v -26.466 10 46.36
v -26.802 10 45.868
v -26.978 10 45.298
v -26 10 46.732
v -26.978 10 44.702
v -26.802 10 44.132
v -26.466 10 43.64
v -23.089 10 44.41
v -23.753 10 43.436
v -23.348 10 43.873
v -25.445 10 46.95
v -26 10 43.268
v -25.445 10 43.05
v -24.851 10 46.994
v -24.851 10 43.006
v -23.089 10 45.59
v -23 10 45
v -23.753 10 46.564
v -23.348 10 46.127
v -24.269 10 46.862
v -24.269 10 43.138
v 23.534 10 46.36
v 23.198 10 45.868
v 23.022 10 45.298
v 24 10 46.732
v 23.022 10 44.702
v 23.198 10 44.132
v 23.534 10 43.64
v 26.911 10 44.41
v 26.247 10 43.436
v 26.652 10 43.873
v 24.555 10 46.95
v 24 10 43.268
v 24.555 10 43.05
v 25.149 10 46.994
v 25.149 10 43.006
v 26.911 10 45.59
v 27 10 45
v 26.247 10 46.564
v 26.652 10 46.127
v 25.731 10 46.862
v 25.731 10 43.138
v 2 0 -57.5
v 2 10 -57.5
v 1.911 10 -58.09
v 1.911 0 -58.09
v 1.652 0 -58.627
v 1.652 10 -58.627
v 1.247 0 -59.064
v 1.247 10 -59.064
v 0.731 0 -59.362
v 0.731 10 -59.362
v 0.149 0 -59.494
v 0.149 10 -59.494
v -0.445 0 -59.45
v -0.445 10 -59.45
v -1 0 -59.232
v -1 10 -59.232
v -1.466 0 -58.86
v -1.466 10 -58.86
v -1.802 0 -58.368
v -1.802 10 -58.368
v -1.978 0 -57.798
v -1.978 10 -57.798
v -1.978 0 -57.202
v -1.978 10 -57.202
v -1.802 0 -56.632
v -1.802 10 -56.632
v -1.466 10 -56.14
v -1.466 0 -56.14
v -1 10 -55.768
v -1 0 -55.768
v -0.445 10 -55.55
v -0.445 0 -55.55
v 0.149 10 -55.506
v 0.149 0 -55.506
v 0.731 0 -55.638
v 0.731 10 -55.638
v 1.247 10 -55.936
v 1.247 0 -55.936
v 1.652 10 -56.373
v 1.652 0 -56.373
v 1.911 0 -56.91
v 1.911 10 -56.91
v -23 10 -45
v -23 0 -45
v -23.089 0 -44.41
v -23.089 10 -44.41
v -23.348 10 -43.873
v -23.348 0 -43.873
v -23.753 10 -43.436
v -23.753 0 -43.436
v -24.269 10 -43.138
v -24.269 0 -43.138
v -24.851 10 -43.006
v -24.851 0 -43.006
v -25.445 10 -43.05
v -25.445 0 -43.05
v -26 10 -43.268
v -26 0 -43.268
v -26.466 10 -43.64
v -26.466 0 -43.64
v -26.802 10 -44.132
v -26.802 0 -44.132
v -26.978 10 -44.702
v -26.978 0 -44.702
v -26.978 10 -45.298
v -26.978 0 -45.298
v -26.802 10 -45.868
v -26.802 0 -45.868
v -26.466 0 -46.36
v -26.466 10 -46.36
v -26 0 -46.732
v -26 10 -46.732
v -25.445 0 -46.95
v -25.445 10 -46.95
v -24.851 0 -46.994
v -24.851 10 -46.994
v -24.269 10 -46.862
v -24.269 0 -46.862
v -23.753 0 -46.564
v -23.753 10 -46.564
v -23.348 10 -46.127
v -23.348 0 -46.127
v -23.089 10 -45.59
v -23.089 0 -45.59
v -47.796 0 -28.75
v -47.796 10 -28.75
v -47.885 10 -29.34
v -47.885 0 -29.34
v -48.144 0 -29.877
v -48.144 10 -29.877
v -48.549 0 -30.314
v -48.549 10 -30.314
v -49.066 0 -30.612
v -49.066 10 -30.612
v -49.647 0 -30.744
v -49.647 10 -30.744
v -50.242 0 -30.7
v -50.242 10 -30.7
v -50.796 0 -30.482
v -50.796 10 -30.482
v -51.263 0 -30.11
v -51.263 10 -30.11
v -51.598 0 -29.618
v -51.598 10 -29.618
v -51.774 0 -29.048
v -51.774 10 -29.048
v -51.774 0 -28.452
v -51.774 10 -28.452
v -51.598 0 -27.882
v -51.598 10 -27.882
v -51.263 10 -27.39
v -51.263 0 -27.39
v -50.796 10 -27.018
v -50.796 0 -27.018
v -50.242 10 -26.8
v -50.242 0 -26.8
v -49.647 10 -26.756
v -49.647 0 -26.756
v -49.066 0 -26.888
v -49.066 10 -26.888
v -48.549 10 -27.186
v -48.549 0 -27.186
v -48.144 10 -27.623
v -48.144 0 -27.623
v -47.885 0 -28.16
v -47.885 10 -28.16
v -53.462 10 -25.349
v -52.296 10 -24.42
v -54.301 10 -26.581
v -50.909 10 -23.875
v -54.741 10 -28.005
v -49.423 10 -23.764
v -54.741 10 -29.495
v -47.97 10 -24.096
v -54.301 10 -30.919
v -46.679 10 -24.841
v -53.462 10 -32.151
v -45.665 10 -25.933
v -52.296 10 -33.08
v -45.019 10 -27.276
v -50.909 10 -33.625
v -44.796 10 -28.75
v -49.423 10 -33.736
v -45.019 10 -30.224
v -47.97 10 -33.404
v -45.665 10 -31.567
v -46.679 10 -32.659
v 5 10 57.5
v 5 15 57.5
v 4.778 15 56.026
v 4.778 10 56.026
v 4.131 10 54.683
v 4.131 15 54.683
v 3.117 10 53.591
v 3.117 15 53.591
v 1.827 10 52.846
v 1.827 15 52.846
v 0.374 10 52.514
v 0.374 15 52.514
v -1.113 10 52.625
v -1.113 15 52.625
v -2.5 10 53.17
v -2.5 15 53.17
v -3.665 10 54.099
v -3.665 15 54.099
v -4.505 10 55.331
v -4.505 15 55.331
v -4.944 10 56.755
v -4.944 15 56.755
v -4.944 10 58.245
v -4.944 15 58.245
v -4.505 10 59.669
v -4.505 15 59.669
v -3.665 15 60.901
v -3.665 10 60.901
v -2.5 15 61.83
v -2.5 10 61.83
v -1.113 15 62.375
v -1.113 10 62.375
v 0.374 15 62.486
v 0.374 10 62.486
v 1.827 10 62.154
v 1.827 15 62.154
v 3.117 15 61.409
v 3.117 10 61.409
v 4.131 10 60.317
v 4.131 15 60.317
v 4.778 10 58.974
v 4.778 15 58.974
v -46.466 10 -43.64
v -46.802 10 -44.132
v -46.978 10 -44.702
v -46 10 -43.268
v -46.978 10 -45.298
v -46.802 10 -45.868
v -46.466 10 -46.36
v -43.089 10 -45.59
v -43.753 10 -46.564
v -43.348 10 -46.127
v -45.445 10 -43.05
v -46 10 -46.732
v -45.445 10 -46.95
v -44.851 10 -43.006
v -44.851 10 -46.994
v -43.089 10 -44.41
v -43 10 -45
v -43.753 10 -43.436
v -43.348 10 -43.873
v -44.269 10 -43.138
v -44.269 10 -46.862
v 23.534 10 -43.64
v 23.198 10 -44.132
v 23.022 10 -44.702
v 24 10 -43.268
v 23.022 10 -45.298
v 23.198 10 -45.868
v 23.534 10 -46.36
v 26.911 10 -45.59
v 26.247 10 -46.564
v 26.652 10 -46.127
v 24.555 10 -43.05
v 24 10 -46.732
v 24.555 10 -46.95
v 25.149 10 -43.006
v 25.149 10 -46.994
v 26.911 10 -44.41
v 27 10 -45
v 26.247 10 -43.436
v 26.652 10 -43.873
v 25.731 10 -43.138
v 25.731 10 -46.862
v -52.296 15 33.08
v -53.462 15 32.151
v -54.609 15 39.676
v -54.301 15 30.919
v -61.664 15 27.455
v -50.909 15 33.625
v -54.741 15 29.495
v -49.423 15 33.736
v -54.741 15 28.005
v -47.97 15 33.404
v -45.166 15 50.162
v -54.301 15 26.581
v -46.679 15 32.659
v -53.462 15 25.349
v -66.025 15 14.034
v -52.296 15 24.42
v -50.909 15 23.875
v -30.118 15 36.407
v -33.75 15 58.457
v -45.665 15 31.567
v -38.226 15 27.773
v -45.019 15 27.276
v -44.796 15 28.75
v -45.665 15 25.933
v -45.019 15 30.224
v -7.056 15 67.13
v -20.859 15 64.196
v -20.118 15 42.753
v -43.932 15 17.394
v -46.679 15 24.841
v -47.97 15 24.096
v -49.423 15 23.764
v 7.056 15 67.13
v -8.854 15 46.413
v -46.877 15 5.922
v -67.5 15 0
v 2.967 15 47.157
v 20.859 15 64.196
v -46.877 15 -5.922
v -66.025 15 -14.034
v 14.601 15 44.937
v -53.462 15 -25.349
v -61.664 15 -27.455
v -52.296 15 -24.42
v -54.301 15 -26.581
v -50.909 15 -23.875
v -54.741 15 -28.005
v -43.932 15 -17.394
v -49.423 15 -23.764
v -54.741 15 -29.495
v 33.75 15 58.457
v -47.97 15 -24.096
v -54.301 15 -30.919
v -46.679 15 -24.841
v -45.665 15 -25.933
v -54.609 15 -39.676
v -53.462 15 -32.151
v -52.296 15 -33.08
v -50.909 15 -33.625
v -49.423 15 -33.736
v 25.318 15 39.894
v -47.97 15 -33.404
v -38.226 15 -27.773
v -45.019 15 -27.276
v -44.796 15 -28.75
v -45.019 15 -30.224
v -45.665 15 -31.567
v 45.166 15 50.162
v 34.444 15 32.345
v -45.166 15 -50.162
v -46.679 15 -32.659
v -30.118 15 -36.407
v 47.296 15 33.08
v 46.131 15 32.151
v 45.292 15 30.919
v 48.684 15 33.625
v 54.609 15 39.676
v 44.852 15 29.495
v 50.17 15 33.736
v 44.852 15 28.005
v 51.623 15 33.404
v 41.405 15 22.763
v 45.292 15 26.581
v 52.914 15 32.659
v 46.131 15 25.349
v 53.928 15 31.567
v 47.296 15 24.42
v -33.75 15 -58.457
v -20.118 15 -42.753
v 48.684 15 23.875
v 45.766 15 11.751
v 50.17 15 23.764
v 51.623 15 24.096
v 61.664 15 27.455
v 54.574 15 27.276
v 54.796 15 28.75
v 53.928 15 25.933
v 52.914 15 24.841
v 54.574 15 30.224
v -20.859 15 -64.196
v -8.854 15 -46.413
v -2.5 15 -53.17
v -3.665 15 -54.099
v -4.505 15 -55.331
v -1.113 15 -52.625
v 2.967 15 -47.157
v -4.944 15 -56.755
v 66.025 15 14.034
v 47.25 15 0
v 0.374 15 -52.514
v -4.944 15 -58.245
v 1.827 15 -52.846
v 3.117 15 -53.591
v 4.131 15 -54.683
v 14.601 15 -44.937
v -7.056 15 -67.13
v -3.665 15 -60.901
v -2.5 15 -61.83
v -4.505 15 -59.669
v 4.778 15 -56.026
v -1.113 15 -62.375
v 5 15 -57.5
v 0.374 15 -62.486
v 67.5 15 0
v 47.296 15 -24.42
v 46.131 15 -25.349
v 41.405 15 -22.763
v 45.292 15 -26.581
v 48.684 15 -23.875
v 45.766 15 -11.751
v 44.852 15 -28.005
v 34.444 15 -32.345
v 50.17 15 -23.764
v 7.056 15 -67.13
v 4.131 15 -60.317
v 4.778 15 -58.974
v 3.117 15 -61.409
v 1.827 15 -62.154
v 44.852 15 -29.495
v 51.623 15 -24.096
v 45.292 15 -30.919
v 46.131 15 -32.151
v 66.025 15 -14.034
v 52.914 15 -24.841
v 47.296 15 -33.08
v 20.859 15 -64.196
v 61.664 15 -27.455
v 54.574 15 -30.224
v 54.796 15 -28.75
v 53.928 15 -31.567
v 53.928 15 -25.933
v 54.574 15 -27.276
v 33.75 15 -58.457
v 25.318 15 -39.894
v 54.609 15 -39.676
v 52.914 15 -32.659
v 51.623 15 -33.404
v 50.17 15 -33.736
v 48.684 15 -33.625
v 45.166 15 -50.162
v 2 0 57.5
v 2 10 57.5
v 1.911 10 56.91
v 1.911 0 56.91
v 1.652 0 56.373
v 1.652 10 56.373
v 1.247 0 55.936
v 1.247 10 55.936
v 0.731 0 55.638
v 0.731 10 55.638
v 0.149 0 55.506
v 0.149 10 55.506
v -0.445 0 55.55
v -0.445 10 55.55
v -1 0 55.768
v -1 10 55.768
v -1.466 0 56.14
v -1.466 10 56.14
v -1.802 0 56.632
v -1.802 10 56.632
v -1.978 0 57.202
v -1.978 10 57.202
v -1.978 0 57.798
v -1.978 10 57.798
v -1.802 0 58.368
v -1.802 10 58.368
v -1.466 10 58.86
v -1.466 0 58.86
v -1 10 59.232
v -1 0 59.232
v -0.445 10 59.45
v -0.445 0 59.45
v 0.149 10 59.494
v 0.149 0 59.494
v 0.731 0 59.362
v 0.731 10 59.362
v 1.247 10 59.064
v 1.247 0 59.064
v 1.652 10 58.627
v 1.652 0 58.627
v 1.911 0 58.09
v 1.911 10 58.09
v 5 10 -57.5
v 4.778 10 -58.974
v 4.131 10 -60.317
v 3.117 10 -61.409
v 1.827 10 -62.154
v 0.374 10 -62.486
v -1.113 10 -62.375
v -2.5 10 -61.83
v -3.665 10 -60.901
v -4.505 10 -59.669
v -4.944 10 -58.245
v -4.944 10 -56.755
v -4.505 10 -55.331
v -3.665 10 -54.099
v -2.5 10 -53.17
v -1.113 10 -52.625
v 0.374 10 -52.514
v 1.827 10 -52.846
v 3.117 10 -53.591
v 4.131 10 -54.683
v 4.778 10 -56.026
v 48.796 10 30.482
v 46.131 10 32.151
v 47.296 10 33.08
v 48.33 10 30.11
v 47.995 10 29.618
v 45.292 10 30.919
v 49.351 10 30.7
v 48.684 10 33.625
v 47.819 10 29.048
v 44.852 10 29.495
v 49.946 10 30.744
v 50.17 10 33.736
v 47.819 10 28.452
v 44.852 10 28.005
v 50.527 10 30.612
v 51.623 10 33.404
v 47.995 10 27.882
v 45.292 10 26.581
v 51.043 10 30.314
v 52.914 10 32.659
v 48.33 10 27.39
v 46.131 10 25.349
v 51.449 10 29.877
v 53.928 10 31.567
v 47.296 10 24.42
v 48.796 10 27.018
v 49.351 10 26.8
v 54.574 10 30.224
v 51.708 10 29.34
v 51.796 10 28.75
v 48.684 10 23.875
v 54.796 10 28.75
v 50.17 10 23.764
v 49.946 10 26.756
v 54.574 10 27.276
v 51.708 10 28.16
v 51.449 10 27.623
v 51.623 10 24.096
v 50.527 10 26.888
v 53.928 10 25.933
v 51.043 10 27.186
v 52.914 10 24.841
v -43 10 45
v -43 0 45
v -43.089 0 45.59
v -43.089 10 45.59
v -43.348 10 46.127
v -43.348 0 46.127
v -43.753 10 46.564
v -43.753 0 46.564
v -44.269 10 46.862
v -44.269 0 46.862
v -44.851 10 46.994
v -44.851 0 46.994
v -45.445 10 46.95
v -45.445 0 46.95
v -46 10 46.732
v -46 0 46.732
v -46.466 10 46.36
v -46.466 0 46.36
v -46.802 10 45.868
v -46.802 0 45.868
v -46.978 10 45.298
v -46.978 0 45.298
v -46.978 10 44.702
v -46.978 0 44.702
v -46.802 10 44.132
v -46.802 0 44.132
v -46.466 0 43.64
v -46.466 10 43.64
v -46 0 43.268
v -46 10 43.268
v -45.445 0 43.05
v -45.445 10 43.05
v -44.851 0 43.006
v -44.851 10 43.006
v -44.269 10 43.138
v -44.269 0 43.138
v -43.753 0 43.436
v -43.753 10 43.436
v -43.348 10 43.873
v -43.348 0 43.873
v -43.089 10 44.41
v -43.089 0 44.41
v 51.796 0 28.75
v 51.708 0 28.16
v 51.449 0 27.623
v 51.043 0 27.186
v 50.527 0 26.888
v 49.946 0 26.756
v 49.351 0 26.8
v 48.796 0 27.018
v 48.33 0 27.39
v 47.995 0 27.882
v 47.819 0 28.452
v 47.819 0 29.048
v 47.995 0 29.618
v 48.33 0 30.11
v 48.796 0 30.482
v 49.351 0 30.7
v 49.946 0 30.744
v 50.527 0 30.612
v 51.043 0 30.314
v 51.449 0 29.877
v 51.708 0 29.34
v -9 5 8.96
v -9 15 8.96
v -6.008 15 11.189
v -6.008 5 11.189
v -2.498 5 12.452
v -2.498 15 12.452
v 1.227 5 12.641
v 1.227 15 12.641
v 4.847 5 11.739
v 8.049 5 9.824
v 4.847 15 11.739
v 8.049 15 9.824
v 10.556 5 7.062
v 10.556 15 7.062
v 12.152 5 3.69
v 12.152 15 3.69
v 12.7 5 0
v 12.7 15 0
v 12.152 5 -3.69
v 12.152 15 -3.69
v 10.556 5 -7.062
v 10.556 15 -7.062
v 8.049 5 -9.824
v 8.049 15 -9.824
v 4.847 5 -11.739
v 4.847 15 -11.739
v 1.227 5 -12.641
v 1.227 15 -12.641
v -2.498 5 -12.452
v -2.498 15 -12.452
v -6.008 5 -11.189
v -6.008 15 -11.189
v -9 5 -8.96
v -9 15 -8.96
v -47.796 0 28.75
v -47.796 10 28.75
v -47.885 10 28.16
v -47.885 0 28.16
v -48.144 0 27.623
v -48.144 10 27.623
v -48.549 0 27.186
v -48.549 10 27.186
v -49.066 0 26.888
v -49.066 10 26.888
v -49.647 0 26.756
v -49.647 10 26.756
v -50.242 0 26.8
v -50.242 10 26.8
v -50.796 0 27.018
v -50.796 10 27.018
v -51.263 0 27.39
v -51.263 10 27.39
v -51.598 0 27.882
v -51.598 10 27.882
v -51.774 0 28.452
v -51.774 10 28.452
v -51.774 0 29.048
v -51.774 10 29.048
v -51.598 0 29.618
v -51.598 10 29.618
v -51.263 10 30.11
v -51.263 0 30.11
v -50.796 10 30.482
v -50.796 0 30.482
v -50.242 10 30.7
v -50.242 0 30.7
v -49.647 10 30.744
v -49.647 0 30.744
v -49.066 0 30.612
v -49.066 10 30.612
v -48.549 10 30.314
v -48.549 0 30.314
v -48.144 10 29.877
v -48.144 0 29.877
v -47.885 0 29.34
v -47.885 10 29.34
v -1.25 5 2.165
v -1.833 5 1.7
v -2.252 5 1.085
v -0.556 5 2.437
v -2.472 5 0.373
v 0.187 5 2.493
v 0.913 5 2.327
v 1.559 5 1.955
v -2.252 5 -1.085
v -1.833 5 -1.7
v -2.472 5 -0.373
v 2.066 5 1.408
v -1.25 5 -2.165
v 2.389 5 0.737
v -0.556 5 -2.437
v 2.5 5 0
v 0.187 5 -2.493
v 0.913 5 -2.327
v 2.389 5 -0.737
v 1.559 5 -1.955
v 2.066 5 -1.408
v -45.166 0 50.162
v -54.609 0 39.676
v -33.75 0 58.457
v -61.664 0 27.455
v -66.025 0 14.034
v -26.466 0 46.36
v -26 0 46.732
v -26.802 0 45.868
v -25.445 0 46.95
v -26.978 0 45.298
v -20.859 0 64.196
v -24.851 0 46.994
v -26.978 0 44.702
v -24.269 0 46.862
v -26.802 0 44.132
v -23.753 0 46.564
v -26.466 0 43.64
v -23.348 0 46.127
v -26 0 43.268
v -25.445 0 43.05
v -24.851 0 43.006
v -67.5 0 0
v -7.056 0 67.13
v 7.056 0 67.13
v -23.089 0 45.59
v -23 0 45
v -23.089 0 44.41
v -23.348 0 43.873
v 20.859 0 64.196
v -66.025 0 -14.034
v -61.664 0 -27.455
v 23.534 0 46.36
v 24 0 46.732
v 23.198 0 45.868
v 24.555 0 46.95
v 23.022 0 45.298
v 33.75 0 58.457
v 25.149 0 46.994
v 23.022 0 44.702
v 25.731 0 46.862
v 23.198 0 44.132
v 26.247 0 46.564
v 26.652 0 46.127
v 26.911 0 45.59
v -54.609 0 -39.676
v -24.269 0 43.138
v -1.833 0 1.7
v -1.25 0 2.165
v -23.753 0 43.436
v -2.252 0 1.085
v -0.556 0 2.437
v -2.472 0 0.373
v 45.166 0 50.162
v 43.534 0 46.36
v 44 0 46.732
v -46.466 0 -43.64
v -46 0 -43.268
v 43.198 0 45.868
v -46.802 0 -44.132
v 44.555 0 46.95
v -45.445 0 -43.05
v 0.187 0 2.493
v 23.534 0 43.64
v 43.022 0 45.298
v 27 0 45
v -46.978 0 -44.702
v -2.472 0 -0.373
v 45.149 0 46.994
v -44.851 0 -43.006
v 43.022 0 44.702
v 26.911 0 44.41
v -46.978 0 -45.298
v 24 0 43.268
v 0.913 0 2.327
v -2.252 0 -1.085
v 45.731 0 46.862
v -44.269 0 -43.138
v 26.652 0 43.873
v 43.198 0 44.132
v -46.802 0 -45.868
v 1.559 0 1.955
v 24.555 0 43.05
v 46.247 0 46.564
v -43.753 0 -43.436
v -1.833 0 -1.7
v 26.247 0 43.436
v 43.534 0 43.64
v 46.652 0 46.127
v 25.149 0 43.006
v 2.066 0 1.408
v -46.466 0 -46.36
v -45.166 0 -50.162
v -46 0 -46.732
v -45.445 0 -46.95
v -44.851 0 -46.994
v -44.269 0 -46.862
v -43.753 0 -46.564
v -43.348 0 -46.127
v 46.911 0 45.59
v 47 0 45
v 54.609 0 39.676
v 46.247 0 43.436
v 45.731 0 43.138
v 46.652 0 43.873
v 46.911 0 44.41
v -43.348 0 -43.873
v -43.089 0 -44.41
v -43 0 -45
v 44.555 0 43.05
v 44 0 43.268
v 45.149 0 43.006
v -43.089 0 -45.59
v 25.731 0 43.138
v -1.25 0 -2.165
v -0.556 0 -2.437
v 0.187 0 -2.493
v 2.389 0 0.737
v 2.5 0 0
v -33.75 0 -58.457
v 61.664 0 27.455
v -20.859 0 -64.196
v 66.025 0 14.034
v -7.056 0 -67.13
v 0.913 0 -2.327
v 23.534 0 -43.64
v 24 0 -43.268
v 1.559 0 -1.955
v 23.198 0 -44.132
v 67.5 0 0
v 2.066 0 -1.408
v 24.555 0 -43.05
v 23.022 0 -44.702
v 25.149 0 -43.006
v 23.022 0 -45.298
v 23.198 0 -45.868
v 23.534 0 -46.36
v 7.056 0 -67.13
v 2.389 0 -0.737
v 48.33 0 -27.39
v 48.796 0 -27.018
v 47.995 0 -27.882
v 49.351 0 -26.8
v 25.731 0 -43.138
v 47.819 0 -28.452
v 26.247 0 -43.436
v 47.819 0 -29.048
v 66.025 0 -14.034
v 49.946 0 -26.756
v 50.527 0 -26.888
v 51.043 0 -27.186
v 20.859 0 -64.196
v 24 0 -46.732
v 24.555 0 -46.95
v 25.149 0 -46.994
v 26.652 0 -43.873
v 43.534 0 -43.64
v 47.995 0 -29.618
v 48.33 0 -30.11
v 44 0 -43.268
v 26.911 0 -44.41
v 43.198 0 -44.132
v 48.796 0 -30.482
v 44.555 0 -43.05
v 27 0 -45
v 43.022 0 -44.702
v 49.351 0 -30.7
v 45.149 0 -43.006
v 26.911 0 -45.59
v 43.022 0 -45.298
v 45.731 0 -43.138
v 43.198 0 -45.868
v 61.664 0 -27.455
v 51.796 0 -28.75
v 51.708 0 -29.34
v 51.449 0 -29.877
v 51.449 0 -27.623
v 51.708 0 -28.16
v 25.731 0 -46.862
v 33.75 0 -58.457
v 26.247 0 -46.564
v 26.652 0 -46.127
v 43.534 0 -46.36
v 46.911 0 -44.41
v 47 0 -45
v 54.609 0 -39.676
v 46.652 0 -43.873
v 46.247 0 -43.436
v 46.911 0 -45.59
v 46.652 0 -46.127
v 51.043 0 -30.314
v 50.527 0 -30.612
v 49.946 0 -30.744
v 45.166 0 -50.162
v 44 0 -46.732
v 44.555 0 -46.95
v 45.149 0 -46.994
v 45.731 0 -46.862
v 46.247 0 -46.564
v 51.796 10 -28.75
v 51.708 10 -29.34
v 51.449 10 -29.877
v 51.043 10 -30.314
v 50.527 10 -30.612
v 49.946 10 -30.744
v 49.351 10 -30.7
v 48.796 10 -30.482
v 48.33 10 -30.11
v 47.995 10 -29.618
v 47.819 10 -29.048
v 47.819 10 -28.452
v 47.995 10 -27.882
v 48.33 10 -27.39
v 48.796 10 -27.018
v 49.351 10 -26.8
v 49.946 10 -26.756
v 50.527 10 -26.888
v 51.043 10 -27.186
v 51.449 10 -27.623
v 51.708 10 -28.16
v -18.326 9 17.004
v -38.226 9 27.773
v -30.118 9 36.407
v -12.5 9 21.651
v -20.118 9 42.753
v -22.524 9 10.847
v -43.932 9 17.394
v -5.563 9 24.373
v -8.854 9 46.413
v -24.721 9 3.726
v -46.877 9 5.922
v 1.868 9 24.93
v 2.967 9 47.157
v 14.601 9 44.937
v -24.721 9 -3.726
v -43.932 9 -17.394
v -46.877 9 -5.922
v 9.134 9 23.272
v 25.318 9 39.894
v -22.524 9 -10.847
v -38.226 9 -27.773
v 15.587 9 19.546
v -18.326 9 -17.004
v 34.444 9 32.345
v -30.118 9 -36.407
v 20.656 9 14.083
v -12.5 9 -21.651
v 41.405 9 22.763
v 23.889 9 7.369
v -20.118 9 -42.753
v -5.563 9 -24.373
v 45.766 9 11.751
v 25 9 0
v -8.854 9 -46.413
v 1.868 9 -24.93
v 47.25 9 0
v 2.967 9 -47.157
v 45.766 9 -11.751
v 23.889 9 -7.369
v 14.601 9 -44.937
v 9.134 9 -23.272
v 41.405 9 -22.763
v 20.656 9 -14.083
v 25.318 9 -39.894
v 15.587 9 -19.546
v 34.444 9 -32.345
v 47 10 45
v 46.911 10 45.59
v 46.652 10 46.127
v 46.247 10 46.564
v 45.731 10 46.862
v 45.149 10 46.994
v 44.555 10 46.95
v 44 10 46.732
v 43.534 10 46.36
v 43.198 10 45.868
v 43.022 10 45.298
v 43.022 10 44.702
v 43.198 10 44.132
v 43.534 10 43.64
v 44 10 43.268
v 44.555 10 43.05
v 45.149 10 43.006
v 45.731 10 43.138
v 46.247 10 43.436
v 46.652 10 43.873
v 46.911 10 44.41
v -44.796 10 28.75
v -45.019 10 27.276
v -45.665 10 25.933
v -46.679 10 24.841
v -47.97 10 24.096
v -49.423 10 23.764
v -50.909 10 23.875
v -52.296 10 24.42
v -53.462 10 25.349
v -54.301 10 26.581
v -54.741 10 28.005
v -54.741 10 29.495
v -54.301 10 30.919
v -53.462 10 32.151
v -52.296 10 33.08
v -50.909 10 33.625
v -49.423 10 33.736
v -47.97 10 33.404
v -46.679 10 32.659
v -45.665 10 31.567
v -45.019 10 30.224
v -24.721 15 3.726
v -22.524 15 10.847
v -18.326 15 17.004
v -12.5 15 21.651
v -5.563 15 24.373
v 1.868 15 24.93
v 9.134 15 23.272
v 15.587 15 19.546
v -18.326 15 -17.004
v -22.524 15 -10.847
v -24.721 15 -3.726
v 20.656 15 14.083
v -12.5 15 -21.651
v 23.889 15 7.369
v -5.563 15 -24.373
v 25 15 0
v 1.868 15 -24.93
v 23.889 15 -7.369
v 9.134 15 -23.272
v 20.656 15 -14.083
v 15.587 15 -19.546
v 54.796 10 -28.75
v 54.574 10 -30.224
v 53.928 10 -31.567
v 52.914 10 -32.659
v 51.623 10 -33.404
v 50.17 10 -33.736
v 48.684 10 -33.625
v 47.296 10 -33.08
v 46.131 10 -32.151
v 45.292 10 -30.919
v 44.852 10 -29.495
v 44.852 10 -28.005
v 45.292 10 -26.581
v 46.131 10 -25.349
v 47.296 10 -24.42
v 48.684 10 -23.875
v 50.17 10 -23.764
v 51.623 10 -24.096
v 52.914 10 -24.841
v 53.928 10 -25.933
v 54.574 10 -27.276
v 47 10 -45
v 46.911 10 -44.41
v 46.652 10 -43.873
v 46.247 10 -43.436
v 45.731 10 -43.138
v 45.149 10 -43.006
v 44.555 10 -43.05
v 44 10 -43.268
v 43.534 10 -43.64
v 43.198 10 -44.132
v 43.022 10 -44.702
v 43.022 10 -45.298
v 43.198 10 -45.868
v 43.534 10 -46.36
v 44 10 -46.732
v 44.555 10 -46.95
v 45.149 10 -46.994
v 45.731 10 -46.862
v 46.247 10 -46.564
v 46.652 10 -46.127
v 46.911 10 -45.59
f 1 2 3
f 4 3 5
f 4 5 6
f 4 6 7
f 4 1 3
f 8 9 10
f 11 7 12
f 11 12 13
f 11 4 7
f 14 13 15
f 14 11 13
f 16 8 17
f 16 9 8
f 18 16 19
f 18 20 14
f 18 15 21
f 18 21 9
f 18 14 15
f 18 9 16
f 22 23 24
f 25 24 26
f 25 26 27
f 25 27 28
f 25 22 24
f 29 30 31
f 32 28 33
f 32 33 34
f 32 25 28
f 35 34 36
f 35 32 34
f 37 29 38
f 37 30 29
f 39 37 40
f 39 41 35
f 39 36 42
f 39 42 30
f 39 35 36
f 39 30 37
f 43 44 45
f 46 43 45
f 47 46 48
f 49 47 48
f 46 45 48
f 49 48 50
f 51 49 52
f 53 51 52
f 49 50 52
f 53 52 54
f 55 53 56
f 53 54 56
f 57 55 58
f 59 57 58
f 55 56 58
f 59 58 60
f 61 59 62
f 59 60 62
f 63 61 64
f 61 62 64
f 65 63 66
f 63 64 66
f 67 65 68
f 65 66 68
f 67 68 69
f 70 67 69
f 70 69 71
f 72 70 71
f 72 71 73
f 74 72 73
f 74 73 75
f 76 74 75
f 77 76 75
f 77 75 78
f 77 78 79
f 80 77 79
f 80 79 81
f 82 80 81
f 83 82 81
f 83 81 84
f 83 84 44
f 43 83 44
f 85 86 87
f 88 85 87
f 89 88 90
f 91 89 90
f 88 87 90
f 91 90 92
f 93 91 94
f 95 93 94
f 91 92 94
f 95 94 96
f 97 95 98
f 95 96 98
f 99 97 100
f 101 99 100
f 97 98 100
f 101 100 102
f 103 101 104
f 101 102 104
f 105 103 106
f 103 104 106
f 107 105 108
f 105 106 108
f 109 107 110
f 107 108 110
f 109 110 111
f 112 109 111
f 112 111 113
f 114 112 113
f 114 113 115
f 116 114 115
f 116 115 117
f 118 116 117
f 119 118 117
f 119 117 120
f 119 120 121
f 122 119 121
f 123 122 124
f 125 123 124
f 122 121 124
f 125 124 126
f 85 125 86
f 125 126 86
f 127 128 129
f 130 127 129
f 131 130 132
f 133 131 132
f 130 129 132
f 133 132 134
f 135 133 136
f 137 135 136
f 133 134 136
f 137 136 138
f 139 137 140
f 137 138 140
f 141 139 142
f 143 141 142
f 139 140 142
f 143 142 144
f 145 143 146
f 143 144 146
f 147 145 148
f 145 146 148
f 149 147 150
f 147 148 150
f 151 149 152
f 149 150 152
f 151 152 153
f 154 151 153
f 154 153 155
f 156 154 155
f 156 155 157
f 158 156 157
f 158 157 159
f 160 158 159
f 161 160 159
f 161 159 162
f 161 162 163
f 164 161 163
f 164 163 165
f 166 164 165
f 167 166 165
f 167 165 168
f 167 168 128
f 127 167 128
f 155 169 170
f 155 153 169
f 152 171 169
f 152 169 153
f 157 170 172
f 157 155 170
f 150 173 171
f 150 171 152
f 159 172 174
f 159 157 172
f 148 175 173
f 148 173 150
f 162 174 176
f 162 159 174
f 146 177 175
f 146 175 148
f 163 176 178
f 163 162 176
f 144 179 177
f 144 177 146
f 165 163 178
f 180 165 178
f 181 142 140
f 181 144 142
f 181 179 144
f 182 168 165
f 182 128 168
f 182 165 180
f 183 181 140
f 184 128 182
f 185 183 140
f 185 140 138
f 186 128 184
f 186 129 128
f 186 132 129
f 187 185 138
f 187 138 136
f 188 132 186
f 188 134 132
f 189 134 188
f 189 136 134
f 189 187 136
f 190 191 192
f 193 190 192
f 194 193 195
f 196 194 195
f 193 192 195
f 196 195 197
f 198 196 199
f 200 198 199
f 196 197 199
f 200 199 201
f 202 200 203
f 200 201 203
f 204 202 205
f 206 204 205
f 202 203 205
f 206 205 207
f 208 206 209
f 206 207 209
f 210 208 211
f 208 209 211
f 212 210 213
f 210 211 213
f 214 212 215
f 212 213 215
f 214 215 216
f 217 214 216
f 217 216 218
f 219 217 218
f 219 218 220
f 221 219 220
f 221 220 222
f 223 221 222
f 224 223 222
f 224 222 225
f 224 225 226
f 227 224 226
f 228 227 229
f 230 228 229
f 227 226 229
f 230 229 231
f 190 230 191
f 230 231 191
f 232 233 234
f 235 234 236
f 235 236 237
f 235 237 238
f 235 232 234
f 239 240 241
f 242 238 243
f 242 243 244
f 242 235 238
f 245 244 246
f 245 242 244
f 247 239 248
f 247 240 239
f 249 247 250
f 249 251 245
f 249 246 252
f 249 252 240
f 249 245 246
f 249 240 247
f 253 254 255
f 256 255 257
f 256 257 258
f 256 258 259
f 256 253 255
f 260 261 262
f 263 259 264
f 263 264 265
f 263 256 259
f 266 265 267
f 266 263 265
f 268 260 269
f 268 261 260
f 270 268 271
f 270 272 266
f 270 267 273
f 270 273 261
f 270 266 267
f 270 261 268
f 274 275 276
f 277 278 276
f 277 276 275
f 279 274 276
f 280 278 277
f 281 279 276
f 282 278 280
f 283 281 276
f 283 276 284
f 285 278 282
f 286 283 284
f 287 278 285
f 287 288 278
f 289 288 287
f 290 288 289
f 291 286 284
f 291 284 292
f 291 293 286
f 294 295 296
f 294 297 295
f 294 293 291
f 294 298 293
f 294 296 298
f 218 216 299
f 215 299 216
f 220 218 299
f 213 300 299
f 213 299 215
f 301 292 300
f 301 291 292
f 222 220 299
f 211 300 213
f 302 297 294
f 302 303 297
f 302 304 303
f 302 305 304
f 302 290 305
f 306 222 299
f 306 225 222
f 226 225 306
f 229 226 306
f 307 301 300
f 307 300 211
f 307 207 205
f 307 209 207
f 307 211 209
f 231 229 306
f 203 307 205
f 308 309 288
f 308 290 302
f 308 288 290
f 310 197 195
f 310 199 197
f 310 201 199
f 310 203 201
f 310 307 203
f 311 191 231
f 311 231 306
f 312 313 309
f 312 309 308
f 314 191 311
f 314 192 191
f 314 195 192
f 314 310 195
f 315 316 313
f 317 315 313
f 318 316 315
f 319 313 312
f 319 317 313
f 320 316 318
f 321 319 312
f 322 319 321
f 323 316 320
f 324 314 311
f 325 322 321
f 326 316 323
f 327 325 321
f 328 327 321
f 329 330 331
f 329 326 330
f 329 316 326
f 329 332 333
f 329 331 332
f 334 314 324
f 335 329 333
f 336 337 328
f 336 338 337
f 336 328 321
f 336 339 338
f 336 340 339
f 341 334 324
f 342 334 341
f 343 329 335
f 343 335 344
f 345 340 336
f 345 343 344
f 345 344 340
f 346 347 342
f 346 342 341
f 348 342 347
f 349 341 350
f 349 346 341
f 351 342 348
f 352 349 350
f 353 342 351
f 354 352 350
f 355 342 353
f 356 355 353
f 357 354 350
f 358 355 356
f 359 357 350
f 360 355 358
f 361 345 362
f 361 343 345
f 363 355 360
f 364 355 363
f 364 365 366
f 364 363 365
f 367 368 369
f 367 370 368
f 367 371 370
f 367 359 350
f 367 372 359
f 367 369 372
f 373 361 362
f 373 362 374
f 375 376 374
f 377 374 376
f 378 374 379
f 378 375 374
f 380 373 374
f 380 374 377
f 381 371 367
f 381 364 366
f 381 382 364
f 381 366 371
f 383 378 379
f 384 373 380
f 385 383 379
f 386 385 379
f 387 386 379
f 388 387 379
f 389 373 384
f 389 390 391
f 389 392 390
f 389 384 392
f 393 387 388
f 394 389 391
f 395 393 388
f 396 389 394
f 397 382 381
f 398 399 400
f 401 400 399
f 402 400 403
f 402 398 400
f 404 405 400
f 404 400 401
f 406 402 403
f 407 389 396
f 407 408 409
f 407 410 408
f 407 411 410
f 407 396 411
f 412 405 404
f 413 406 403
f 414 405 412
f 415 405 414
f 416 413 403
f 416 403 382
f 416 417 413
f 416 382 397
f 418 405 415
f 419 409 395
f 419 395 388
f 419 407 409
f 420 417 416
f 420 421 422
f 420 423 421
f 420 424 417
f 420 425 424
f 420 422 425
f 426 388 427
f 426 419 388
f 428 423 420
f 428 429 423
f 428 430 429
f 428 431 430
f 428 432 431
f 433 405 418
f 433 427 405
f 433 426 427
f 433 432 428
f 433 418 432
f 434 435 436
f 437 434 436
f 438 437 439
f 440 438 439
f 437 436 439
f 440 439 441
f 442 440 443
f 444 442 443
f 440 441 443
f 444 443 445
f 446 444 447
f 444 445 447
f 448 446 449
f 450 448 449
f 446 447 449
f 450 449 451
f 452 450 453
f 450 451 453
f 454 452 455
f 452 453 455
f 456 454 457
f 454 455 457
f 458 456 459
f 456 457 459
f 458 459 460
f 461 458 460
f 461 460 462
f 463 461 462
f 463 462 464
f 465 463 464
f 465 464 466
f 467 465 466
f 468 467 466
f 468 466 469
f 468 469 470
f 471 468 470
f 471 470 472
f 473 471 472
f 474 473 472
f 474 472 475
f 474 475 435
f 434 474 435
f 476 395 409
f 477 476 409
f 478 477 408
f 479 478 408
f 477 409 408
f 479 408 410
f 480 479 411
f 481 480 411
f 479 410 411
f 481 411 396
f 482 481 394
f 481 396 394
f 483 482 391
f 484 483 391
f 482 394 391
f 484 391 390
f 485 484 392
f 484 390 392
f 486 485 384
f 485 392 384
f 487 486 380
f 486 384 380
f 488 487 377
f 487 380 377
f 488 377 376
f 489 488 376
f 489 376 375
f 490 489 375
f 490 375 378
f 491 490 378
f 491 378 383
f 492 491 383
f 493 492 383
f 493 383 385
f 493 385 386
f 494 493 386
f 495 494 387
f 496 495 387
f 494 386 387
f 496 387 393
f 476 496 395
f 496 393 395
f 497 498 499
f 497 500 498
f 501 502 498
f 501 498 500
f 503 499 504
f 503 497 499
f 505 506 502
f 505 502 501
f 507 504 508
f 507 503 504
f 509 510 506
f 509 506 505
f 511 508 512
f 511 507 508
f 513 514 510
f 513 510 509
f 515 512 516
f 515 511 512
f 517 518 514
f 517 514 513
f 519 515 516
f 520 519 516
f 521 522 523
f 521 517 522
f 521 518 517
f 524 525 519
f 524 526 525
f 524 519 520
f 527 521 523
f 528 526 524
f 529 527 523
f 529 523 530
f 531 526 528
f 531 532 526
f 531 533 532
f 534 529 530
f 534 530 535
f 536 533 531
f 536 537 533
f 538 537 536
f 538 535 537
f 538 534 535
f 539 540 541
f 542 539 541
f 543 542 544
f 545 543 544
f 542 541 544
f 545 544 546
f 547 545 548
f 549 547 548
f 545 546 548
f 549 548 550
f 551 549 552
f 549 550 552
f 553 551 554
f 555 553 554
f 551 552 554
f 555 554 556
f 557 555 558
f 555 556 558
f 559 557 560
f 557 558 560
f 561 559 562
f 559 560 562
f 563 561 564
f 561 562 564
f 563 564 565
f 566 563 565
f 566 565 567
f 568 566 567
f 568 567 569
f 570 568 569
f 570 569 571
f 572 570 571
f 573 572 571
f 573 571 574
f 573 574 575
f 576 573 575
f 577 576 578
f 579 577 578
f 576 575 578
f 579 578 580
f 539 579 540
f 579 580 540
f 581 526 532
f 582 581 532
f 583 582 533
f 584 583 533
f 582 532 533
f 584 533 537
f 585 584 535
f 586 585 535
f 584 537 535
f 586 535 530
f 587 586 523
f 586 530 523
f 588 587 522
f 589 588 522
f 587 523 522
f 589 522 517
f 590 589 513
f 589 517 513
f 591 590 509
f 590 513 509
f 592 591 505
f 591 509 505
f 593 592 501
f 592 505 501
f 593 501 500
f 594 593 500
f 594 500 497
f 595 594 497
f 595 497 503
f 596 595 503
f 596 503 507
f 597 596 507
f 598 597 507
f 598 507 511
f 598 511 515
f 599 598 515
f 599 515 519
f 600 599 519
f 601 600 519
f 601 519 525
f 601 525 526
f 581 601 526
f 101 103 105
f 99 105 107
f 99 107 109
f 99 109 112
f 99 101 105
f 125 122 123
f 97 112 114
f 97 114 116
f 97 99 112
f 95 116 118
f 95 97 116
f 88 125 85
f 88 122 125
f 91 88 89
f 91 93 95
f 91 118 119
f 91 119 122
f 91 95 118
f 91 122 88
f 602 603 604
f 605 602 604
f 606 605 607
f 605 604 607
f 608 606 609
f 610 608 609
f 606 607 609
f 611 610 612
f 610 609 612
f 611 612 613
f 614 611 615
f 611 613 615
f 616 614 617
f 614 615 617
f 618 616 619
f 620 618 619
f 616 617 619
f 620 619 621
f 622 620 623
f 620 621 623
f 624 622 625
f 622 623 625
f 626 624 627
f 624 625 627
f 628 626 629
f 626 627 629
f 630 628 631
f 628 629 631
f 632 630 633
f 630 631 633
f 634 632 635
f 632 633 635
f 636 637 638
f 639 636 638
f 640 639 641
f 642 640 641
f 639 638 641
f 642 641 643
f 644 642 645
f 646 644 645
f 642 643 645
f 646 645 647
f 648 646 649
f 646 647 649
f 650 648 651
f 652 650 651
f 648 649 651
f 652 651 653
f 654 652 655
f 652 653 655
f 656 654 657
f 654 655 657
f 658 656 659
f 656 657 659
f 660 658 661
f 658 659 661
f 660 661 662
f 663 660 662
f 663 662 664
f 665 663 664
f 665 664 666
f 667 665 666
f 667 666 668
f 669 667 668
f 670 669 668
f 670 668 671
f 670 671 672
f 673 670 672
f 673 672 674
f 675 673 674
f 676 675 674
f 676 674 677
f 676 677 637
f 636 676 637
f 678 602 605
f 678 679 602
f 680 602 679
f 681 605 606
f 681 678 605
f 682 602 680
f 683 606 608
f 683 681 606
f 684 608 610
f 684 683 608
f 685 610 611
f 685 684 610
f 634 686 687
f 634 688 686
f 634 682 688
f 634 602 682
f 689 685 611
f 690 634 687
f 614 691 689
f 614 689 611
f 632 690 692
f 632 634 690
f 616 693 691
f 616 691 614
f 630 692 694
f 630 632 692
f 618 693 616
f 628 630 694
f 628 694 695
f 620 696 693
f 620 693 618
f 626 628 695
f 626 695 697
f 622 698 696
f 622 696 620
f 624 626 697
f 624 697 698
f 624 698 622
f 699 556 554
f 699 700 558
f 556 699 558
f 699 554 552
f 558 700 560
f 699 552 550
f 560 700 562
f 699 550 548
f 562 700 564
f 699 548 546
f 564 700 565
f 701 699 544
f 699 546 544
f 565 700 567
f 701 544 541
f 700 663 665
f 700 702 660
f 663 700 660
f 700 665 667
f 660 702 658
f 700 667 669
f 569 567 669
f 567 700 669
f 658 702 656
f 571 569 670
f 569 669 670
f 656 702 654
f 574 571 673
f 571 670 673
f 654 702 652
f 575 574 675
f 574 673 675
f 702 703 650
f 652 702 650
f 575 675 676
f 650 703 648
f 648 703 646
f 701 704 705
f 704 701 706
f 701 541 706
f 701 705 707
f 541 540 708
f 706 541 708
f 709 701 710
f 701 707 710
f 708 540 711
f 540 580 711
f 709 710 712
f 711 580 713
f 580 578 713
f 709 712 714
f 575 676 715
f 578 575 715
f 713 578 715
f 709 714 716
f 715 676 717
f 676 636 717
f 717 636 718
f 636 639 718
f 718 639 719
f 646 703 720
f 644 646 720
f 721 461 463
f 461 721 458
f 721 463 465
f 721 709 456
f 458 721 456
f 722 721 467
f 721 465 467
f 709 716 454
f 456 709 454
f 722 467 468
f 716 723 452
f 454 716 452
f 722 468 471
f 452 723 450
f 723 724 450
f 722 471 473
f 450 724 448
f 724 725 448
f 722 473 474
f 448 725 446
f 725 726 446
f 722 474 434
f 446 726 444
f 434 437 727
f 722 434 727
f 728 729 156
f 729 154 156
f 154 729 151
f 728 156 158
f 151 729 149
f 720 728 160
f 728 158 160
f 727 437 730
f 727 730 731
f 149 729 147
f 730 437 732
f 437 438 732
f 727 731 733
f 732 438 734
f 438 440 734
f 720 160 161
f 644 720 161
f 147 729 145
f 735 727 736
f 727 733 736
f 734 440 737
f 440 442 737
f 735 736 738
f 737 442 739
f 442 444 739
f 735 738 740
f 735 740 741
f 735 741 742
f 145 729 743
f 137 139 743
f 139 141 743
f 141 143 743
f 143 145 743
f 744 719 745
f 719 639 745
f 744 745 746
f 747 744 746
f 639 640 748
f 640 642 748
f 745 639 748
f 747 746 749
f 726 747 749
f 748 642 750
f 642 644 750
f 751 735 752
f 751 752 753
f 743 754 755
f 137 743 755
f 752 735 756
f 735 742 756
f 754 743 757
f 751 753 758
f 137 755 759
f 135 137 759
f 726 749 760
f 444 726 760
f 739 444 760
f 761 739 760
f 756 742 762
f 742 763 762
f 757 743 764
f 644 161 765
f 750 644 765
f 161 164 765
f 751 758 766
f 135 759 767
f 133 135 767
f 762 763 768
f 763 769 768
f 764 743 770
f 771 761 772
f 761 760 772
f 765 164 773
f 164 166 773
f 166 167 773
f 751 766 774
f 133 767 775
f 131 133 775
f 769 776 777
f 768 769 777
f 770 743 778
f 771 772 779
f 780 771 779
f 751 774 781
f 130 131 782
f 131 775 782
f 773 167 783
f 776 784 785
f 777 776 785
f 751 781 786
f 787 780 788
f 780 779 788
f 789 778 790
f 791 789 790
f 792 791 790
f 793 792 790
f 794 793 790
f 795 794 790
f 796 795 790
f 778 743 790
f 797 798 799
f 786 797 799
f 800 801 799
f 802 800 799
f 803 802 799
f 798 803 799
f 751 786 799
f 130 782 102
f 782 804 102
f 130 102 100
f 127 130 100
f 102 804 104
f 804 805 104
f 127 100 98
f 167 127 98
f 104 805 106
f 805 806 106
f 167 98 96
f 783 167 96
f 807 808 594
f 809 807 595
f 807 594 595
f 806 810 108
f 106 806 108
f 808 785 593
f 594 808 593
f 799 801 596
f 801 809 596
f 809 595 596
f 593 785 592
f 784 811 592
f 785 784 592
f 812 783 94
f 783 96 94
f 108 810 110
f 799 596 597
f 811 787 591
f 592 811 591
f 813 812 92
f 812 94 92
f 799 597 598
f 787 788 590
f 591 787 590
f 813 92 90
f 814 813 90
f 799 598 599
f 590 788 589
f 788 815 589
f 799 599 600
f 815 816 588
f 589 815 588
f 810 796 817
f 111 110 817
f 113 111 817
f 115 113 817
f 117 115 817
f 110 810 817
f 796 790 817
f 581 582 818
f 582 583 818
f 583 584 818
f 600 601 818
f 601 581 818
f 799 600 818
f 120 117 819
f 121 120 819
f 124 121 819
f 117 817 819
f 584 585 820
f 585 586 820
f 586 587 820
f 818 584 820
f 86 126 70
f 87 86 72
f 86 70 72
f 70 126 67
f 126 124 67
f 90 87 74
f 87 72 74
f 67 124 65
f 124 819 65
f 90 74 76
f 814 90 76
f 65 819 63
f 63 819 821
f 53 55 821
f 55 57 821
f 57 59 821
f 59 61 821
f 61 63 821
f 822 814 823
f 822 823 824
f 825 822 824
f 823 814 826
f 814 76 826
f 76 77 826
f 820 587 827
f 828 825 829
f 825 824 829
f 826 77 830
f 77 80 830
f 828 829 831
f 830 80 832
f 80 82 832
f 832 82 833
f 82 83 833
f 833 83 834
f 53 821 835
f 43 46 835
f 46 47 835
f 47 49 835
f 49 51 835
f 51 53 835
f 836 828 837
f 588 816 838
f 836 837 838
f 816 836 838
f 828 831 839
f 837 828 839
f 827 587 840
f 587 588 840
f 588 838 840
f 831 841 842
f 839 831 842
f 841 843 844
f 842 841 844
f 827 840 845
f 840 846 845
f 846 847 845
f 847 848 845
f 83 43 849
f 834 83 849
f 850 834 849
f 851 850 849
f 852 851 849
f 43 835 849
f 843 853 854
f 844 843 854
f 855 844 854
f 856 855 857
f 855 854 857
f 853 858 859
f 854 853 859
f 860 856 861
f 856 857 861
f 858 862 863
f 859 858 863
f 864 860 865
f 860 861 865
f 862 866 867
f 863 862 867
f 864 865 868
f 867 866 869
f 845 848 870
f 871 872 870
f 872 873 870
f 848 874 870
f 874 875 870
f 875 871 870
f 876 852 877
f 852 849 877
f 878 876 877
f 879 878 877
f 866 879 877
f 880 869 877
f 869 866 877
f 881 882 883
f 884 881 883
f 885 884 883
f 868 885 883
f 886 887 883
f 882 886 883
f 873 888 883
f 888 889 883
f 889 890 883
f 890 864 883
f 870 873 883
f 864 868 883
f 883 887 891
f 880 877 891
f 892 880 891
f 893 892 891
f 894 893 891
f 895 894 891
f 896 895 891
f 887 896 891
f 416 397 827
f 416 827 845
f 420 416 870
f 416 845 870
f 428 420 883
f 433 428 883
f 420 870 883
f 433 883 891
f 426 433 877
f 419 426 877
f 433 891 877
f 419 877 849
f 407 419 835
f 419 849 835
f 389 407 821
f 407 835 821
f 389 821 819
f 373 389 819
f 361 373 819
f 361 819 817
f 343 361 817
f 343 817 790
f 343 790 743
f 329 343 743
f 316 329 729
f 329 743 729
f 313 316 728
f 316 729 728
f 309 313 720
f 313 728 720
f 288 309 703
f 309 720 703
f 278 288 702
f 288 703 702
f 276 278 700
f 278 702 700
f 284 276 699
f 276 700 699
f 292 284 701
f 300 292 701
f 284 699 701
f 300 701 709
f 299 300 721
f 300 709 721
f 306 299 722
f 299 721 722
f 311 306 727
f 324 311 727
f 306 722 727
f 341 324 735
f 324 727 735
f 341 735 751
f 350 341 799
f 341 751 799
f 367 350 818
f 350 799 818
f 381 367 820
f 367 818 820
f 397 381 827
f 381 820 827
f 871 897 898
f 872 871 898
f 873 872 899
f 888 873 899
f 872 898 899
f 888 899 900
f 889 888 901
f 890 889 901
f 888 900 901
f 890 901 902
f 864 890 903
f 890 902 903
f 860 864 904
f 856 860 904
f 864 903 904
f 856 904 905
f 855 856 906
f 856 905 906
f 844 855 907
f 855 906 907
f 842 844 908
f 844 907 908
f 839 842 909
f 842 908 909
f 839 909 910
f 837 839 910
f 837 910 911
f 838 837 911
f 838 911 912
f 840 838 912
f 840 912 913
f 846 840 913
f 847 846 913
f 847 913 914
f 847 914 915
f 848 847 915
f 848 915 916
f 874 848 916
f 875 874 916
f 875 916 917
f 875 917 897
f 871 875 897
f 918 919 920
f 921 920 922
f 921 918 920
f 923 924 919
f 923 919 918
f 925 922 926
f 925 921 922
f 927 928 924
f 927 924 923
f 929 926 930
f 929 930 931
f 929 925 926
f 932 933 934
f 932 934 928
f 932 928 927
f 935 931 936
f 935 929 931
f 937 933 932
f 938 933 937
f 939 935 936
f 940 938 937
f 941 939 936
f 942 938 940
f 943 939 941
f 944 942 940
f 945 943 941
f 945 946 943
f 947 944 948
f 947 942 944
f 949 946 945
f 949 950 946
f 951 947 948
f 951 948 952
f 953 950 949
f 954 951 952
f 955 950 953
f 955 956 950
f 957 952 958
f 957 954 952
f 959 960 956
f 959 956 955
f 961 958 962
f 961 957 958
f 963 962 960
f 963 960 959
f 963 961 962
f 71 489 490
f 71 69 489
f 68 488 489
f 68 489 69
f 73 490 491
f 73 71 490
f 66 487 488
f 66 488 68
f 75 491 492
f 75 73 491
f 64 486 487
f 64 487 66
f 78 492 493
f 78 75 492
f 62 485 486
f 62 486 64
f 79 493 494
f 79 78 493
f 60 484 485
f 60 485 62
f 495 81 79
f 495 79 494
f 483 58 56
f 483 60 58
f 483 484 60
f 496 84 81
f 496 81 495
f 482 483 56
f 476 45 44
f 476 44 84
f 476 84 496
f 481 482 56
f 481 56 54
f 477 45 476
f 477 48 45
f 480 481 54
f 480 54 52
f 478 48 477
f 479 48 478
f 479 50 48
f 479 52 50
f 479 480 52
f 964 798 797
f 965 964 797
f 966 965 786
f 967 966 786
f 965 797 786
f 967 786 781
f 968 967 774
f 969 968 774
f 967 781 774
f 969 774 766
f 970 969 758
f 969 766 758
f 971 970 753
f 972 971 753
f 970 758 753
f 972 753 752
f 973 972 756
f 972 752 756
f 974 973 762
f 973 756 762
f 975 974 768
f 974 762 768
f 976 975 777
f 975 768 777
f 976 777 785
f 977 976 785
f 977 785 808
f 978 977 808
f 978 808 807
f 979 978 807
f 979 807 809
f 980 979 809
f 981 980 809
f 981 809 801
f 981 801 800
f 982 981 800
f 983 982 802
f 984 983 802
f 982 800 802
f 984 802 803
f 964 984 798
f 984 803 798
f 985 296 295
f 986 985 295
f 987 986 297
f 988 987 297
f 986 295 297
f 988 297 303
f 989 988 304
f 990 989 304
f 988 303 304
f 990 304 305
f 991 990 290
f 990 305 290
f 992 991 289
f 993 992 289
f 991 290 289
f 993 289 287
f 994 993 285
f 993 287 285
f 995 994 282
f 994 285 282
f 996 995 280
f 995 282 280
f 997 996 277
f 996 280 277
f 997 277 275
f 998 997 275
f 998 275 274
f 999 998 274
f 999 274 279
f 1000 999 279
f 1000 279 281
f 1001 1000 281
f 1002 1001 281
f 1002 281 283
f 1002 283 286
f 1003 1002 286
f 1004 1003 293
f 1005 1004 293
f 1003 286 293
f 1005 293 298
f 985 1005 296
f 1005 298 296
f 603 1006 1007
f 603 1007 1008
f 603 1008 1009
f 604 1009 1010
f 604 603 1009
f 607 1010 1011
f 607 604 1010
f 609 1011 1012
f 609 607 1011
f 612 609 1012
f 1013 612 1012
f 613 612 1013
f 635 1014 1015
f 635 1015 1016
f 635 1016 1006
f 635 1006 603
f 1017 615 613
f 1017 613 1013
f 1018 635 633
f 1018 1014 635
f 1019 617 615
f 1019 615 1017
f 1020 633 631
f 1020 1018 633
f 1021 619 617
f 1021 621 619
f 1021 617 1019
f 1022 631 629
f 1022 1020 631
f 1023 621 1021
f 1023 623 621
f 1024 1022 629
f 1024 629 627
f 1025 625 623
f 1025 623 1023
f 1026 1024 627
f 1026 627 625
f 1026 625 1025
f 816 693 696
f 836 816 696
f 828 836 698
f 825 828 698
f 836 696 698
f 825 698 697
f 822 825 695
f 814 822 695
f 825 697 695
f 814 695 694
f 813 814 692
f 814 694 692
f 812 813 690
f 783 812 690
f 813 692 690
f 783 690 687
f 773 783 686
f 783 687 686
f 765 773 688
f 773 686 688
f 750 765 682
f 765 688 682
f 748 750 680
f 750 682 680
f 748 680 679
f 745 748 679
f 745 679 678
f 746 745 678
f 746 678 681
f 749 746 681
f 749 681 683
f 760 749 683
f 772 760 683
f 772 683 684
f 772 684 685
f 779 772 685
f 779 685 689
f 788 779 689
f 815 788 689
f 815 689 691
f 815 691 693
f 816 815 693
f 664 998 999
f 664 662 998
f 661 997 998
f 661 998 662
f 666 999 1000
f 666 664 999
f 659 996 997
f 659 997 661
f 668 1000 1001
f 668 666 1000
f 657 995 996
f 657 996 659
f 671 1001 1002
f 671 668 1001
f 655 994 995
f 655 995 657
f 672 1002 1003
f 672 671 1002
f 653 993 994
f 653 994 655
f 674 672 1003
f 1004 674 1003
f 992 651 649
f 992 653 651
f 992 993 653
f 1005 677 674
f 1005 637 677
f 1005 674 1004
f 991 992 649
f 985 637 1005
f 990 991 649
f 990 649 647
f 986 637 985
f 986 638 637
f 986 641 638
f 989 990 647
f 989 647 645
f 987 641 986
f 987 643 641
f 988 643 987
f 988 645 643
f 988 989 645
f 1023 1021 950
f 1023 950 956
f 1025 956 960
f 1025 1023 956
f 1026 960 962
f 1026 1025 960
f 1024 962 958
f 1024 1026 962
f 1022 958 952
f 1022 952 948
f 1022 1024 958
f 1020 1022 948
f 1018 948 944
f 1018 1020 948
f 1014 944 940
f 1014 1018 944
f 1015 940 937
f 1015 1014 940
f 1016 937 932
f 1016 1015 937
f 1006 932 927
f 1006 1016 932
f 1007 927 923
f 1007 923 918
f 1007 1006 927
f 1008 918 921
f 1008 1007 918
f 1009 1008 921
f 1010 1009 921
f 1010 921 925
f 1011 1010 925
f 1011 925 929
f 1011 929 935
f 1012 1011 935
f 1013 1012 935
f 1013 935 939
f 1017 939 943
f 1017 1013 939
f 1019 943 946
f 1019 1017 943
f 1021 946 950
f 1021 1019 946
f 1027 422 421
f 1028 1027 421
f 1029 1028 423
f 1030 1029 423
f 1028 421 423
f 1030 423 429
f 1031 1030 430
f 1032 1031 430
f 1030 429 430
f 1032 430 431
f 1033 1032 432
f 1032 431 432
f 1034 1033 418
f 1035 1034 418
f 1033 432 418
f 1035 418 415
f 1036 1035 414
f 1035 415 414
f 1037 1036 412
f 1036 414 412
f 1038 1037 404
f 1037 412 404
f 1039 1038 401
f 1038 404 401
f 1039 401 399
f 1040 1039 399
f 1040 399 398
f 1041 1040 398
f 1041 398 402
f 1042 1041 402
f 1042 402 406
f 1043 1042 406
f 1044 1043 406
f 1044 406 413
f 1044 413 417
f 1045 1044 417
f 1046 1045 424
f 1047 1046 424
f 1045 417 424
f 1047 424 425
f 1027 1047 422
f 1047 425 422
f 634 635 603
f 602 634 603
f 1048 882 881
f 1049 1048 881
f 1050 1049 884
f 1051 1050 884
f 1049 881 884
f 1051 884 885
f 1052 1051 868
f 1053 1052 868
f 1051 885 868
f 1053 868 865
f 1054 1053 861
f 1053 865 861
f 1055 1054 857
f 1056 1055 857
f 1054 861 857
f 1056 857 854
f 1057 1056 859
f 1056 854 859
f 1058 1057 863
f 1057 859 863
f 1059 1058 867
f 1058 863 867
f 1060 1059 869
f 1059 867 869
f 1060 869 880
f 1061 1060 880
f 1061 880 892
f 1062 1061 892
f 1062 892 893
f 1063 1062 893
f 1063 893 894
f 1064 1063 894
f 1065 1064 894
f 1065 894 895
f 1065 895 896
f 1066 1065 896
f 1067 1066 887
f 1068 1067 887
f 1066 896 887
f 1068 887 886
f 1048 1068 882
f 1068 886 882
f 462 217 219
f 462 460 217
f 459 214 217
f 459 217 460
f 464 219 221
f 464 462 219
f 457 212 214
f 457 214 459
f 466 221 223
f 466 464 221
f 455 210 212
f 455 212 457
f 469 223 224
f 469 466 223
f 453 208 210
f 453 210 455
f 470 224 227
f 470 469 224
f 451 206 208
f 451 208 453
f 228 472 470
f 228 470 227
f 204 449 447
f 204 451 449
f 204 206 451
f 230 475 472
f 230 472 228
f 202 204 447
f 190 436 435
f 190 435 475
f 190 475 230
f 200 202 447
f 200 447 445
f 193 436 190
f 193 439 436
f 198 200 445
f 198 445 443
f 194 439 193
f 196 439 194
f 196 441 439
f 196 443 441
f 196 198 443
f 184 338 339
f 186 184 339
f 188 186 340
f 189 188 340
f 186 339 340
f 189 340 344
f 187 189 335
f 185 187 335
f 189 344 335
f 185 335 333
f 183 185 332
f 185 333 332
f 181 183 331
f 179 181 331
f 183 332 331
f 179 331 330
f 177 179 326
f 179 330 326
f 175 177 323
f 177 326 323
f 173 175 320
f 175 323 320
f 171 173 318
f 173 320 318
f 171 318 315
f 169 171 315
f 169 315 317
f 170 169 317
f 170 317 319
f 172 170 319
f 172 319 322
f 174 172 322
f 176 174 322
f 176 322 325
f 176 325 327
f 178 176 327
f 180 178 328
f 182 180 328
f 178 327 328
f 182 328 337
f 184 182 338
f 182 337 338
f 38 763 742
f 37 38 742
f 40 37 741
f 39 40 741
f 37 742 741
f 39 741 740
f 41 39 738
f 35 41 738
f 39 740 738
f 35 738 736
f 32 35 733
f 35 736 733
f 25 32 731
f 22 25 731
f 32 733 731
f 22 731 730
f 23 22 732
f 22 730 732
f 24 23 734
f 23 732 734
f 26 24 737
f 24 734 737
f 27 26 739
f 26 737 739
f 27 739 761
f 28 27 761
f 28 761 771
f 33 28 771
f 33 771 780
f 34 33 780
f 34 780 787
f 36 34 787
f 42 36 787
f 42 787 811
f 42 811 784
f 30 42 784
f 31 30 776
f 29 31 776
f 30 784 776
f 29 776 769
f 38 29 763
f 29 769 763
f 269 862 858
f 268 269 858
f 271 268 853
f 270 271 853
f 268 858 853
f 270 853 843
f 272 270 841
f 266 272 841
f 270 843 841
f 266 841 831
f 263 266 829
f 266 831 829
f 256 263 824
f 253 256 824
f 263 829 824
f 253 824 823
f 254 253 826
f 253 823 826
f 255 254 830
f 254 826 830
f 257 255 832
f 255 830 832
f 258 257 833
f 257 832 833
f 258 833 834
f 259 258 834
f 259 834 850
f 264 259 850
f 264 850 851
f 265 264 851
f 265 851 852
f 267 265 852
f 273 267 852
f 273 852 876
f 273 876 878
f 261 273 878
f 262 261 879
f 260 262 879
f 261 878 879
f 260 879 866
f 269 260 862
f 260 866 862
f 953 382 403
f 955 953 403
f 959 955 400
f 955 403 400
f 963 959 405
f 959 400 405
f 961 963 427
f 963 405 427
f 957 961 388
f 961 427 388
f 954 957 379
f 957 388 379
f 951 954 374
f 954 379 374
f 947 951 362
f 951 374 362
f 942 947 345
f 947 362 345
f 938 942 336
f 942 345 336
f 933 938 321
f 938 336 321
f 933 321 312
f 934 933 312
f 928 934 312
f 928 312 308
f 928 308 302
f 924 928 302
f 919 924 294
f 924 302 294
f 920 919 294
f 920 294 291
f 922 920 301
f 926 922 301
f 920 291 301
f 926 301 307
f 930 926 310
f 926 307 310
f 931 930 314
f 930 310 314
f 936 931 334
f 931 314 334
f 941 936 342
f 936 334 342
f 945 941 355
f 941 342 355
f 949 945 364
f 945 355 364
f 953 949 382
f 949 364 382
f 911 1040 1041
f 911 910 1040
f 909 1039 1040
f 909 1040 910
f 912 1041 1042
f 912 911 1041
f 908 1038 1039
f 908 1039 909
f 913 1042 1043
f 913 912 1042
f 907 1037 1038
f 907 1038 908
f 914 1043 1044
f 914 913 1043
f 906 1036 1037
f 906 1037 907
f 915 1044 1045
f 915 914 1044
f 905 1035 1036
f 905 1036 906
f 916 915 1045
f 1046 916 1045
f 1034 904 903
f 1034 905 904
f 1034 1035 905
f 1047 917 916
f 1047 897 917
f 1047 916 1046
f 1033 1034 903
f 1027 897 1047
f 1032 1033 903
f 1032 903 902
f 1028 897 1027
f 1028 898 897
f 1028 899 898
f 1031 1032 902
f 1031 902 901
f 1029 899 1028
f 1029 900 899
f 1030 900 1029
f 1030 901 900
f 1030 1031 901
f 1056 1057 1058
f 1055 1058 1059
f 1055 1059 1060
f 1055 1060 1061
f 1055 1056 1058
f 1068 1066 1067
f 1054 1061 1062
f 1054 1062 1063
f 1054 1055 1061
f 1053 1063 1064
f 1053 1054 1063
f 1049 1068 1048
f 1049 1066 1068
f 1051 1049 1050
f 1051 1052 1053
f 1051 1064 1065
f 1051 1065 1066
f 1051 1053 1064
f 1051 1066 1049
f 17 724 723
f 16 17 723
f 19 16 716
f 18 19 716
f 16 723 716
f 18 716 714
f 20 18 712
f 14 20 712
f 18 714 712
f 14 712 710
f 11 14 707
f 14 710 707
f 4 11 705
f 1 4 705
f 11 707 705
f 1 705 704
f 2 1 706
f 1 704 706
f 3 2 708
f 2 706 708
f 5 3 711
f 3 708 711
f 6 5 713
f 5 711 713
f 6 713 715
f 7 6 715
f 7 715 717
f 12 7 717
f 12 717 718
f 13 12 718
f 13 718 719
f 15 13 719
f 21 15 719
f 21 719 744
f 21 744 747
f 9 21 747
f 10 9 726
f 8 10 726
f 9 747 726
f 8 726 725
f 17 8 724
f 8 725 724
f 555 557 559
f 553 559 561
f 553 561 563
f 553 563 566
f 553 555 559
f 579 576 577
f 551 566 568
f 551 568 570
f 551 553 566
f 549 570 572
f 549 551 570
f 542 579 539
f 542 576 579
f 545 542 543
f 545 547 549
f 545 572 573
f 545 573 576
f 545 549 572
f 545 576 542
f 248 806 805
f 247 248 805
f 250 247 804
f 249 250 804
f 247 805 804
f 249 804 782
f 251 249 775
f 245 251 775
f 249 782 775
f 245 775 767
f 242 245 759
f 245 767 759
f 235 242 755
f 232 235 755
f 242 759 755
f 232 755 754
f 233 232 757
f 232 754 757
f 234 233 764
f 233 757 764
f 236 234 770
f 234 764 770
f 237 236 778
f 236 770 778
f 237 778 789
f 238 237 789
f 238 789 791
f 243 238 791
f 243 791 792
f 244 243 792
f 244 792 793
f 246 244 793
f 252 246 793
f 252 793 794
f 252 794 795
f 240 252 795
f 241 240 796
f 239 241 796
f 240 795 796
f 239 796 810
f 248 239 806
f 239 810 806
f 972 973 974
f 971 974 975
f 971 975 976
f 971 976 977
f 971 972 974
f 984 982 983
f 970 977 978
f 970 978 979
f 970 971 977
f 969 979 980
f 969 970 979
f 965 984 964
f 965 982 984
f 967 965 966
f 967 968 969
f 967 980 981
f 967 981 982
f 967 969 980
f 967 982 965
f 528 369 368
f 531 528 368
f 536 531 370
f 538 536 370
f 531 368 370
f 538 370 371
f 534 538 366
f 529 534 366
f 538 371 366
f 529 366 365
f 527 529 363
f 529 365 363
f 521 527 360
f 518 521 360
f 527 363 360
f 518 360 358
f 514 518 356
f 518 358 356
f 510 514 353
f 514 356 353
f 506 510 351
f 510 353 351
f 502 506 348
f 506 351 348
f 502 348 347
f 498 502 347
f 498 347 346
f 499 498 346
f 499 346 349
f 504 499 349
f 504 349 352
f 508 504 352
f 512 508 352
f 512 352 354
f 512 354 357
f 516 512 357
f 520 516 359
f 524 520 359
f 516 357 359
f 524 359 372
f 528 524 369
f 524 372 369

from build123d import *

# Parameters (mm, degrees)
SKETCH1_R           = 67.5
BOSS_EXTRUDE1_DEPTH = 15
SKETCH2_R           = 47.25
SKETCH2_R_2         = 25
CUT_EXTRUDE1_DEPTH  = 6
CUT_EXTRUDE2_DEPTH  = 10
SKETCH5_R           = 2.5
CUT_EXTRUDE3_DEPTH  = 10
SKETCH6_R           = 2
CUT_EXTRUDE4_DEPTH  = 15
SKETCH7_R           = 5
CUT_EXTRUDE5_DEPTH  = 5
SKETCH8_R           = 2
CUT_EXTRUDE6_DEPTH  = 10


with BuildPart() as part:
    # Sketch1 → Boss-Extrude1 (new body)
    with BuildSketch(Plane(origin=(0, 0, 0), x_dir=(1, 0, 0), z_dir=(0, 1, 0))):
        Circle(SKETCH1_R)
    extrude(amount=BOSS_EXTRUDE1_DEPTH)

    # Sketch2 → Cut-Extrude1 (cut)
    with BuildSketch(Plane(origin=(0, 15, 0), x_dir=(1, 0, 0), z_dir=(0, 1, 0))):
        Circle(SKETCH2_R)
        Circle(SKETCH2_R_2, mode=Mode.SUBTRACT)
    extrude(amount=-CUT_EXTRUDE1_DEPTH, mode=Mode.SUBTRACT)

    # Sketch3 → Cut-Extrude2 (cut)
    with BuildSketch(Plane(origin=(0, 15, 0), x_dir=(1, 0, 0), z_dir=(0, 1, 0))):
        with BuildLine():
            Line((-9, 8.960468738), (-9, -8.960468738))
            ThreePointArc((-9, -8.960468738), (12.7, 0), (-9, 8.960468738))
        make_face()
    extrude(amount=-CUT_EXTRUDE2_DEPTH, mode=Mode.SUBTRACT)

    # Sketch5 → Cut-Extrude3 (cut)
    with BuildSketch(Plane(origin=(0, 5, 0), x_dir=(1, 0, 0), z_dir=(0, 1, 0))):
        Circle(SKETCH5_R)
    extrude(amount=-CUT_EXTRUDE3_DEPTH, mode=Mode.SUBTRACT)

    # Sketch6 → Cut-Extrude4 (cut)
    with BuildSketch(Plane(origin=(0, 15, 0), x_dir=(1, 0, 0), z_dir=(0, 1, 0))):
        with Locations((0, 57.5)):
            Circle(SKETCH6_R)
        with Locations((49.796460718, 28.75)):
            Circle(SKETCH6_R)
        with Locations((49.796460718, -28.75)):
            Circle(SKETCH6_R)
        with Locations((0, -57.5)):
            Circle(SKETCH6_R)
        with Locations((-49.796460718, -28.75)):
            Circle(SKETCH6_R)
        with Locations((-49.796460718, 28.75)):
            Circle(SKETCH6_R)
    extrude(amount=-CUT_EXTRUDE4_DEPTH, mode=Mode.SUBTRACT)

    # Sketch7 → Cut-Extrude5 (cut)
    with BuildSketch(Plane(origin=(0, 15, 0), x_dir=(1, 0, 0), z_dir=(0, 1, 0))):
        with Locations((0, 57.5)):
            Circle(SKETCH7_R)
        with Locations((49.796460718, 28.75)):
            Circle(SKETCH7_R)
        with Locations((49.796460718, -28.75)):
            Circle(SKETCH7_R)
        with Locations((0, -57.5)):
            Circle(SKETCH7_R)
        with Locations((-49.796460718, -28.75)):
            Circle(SKETCH7_R)
        with Locations((-49.796460718, 28.75)):
            Circle(SKETCH7_R)
    extrude(amount=-CUT_EXTRUDE5_DEPTH, mode=Mode.SUBTRACT)

    # Sketch8 → Cut-Extrude6 (cut)
    with BuildSketch(Plane.XZ):
        with Locations((-25, 45)):
            Circle(SKETCH8_R)
        with Locations((-45, 45)):
            Circle(SKETCH8_R)
        with Locations((25, 45)):
            Circle(SKETCH8_R)
        with Locations((45, 45)):
            Circle(SKETCH8_R)
        with Locations((45, -45)):
            Circle(SKETCH8_R)
        with Locations((25, -45)):
            Circle(SKETCH8_R)
        with Locations((-25, -45)):
            Circle(SKETCH8_R)
        with Locations((-45, -45)):
            Circle(SKETCH8_R)
    extrude(amount=-CUT_EXTRUDE6_DEPTH, mode=Mode.SUBTRACT)


solid = part.part
